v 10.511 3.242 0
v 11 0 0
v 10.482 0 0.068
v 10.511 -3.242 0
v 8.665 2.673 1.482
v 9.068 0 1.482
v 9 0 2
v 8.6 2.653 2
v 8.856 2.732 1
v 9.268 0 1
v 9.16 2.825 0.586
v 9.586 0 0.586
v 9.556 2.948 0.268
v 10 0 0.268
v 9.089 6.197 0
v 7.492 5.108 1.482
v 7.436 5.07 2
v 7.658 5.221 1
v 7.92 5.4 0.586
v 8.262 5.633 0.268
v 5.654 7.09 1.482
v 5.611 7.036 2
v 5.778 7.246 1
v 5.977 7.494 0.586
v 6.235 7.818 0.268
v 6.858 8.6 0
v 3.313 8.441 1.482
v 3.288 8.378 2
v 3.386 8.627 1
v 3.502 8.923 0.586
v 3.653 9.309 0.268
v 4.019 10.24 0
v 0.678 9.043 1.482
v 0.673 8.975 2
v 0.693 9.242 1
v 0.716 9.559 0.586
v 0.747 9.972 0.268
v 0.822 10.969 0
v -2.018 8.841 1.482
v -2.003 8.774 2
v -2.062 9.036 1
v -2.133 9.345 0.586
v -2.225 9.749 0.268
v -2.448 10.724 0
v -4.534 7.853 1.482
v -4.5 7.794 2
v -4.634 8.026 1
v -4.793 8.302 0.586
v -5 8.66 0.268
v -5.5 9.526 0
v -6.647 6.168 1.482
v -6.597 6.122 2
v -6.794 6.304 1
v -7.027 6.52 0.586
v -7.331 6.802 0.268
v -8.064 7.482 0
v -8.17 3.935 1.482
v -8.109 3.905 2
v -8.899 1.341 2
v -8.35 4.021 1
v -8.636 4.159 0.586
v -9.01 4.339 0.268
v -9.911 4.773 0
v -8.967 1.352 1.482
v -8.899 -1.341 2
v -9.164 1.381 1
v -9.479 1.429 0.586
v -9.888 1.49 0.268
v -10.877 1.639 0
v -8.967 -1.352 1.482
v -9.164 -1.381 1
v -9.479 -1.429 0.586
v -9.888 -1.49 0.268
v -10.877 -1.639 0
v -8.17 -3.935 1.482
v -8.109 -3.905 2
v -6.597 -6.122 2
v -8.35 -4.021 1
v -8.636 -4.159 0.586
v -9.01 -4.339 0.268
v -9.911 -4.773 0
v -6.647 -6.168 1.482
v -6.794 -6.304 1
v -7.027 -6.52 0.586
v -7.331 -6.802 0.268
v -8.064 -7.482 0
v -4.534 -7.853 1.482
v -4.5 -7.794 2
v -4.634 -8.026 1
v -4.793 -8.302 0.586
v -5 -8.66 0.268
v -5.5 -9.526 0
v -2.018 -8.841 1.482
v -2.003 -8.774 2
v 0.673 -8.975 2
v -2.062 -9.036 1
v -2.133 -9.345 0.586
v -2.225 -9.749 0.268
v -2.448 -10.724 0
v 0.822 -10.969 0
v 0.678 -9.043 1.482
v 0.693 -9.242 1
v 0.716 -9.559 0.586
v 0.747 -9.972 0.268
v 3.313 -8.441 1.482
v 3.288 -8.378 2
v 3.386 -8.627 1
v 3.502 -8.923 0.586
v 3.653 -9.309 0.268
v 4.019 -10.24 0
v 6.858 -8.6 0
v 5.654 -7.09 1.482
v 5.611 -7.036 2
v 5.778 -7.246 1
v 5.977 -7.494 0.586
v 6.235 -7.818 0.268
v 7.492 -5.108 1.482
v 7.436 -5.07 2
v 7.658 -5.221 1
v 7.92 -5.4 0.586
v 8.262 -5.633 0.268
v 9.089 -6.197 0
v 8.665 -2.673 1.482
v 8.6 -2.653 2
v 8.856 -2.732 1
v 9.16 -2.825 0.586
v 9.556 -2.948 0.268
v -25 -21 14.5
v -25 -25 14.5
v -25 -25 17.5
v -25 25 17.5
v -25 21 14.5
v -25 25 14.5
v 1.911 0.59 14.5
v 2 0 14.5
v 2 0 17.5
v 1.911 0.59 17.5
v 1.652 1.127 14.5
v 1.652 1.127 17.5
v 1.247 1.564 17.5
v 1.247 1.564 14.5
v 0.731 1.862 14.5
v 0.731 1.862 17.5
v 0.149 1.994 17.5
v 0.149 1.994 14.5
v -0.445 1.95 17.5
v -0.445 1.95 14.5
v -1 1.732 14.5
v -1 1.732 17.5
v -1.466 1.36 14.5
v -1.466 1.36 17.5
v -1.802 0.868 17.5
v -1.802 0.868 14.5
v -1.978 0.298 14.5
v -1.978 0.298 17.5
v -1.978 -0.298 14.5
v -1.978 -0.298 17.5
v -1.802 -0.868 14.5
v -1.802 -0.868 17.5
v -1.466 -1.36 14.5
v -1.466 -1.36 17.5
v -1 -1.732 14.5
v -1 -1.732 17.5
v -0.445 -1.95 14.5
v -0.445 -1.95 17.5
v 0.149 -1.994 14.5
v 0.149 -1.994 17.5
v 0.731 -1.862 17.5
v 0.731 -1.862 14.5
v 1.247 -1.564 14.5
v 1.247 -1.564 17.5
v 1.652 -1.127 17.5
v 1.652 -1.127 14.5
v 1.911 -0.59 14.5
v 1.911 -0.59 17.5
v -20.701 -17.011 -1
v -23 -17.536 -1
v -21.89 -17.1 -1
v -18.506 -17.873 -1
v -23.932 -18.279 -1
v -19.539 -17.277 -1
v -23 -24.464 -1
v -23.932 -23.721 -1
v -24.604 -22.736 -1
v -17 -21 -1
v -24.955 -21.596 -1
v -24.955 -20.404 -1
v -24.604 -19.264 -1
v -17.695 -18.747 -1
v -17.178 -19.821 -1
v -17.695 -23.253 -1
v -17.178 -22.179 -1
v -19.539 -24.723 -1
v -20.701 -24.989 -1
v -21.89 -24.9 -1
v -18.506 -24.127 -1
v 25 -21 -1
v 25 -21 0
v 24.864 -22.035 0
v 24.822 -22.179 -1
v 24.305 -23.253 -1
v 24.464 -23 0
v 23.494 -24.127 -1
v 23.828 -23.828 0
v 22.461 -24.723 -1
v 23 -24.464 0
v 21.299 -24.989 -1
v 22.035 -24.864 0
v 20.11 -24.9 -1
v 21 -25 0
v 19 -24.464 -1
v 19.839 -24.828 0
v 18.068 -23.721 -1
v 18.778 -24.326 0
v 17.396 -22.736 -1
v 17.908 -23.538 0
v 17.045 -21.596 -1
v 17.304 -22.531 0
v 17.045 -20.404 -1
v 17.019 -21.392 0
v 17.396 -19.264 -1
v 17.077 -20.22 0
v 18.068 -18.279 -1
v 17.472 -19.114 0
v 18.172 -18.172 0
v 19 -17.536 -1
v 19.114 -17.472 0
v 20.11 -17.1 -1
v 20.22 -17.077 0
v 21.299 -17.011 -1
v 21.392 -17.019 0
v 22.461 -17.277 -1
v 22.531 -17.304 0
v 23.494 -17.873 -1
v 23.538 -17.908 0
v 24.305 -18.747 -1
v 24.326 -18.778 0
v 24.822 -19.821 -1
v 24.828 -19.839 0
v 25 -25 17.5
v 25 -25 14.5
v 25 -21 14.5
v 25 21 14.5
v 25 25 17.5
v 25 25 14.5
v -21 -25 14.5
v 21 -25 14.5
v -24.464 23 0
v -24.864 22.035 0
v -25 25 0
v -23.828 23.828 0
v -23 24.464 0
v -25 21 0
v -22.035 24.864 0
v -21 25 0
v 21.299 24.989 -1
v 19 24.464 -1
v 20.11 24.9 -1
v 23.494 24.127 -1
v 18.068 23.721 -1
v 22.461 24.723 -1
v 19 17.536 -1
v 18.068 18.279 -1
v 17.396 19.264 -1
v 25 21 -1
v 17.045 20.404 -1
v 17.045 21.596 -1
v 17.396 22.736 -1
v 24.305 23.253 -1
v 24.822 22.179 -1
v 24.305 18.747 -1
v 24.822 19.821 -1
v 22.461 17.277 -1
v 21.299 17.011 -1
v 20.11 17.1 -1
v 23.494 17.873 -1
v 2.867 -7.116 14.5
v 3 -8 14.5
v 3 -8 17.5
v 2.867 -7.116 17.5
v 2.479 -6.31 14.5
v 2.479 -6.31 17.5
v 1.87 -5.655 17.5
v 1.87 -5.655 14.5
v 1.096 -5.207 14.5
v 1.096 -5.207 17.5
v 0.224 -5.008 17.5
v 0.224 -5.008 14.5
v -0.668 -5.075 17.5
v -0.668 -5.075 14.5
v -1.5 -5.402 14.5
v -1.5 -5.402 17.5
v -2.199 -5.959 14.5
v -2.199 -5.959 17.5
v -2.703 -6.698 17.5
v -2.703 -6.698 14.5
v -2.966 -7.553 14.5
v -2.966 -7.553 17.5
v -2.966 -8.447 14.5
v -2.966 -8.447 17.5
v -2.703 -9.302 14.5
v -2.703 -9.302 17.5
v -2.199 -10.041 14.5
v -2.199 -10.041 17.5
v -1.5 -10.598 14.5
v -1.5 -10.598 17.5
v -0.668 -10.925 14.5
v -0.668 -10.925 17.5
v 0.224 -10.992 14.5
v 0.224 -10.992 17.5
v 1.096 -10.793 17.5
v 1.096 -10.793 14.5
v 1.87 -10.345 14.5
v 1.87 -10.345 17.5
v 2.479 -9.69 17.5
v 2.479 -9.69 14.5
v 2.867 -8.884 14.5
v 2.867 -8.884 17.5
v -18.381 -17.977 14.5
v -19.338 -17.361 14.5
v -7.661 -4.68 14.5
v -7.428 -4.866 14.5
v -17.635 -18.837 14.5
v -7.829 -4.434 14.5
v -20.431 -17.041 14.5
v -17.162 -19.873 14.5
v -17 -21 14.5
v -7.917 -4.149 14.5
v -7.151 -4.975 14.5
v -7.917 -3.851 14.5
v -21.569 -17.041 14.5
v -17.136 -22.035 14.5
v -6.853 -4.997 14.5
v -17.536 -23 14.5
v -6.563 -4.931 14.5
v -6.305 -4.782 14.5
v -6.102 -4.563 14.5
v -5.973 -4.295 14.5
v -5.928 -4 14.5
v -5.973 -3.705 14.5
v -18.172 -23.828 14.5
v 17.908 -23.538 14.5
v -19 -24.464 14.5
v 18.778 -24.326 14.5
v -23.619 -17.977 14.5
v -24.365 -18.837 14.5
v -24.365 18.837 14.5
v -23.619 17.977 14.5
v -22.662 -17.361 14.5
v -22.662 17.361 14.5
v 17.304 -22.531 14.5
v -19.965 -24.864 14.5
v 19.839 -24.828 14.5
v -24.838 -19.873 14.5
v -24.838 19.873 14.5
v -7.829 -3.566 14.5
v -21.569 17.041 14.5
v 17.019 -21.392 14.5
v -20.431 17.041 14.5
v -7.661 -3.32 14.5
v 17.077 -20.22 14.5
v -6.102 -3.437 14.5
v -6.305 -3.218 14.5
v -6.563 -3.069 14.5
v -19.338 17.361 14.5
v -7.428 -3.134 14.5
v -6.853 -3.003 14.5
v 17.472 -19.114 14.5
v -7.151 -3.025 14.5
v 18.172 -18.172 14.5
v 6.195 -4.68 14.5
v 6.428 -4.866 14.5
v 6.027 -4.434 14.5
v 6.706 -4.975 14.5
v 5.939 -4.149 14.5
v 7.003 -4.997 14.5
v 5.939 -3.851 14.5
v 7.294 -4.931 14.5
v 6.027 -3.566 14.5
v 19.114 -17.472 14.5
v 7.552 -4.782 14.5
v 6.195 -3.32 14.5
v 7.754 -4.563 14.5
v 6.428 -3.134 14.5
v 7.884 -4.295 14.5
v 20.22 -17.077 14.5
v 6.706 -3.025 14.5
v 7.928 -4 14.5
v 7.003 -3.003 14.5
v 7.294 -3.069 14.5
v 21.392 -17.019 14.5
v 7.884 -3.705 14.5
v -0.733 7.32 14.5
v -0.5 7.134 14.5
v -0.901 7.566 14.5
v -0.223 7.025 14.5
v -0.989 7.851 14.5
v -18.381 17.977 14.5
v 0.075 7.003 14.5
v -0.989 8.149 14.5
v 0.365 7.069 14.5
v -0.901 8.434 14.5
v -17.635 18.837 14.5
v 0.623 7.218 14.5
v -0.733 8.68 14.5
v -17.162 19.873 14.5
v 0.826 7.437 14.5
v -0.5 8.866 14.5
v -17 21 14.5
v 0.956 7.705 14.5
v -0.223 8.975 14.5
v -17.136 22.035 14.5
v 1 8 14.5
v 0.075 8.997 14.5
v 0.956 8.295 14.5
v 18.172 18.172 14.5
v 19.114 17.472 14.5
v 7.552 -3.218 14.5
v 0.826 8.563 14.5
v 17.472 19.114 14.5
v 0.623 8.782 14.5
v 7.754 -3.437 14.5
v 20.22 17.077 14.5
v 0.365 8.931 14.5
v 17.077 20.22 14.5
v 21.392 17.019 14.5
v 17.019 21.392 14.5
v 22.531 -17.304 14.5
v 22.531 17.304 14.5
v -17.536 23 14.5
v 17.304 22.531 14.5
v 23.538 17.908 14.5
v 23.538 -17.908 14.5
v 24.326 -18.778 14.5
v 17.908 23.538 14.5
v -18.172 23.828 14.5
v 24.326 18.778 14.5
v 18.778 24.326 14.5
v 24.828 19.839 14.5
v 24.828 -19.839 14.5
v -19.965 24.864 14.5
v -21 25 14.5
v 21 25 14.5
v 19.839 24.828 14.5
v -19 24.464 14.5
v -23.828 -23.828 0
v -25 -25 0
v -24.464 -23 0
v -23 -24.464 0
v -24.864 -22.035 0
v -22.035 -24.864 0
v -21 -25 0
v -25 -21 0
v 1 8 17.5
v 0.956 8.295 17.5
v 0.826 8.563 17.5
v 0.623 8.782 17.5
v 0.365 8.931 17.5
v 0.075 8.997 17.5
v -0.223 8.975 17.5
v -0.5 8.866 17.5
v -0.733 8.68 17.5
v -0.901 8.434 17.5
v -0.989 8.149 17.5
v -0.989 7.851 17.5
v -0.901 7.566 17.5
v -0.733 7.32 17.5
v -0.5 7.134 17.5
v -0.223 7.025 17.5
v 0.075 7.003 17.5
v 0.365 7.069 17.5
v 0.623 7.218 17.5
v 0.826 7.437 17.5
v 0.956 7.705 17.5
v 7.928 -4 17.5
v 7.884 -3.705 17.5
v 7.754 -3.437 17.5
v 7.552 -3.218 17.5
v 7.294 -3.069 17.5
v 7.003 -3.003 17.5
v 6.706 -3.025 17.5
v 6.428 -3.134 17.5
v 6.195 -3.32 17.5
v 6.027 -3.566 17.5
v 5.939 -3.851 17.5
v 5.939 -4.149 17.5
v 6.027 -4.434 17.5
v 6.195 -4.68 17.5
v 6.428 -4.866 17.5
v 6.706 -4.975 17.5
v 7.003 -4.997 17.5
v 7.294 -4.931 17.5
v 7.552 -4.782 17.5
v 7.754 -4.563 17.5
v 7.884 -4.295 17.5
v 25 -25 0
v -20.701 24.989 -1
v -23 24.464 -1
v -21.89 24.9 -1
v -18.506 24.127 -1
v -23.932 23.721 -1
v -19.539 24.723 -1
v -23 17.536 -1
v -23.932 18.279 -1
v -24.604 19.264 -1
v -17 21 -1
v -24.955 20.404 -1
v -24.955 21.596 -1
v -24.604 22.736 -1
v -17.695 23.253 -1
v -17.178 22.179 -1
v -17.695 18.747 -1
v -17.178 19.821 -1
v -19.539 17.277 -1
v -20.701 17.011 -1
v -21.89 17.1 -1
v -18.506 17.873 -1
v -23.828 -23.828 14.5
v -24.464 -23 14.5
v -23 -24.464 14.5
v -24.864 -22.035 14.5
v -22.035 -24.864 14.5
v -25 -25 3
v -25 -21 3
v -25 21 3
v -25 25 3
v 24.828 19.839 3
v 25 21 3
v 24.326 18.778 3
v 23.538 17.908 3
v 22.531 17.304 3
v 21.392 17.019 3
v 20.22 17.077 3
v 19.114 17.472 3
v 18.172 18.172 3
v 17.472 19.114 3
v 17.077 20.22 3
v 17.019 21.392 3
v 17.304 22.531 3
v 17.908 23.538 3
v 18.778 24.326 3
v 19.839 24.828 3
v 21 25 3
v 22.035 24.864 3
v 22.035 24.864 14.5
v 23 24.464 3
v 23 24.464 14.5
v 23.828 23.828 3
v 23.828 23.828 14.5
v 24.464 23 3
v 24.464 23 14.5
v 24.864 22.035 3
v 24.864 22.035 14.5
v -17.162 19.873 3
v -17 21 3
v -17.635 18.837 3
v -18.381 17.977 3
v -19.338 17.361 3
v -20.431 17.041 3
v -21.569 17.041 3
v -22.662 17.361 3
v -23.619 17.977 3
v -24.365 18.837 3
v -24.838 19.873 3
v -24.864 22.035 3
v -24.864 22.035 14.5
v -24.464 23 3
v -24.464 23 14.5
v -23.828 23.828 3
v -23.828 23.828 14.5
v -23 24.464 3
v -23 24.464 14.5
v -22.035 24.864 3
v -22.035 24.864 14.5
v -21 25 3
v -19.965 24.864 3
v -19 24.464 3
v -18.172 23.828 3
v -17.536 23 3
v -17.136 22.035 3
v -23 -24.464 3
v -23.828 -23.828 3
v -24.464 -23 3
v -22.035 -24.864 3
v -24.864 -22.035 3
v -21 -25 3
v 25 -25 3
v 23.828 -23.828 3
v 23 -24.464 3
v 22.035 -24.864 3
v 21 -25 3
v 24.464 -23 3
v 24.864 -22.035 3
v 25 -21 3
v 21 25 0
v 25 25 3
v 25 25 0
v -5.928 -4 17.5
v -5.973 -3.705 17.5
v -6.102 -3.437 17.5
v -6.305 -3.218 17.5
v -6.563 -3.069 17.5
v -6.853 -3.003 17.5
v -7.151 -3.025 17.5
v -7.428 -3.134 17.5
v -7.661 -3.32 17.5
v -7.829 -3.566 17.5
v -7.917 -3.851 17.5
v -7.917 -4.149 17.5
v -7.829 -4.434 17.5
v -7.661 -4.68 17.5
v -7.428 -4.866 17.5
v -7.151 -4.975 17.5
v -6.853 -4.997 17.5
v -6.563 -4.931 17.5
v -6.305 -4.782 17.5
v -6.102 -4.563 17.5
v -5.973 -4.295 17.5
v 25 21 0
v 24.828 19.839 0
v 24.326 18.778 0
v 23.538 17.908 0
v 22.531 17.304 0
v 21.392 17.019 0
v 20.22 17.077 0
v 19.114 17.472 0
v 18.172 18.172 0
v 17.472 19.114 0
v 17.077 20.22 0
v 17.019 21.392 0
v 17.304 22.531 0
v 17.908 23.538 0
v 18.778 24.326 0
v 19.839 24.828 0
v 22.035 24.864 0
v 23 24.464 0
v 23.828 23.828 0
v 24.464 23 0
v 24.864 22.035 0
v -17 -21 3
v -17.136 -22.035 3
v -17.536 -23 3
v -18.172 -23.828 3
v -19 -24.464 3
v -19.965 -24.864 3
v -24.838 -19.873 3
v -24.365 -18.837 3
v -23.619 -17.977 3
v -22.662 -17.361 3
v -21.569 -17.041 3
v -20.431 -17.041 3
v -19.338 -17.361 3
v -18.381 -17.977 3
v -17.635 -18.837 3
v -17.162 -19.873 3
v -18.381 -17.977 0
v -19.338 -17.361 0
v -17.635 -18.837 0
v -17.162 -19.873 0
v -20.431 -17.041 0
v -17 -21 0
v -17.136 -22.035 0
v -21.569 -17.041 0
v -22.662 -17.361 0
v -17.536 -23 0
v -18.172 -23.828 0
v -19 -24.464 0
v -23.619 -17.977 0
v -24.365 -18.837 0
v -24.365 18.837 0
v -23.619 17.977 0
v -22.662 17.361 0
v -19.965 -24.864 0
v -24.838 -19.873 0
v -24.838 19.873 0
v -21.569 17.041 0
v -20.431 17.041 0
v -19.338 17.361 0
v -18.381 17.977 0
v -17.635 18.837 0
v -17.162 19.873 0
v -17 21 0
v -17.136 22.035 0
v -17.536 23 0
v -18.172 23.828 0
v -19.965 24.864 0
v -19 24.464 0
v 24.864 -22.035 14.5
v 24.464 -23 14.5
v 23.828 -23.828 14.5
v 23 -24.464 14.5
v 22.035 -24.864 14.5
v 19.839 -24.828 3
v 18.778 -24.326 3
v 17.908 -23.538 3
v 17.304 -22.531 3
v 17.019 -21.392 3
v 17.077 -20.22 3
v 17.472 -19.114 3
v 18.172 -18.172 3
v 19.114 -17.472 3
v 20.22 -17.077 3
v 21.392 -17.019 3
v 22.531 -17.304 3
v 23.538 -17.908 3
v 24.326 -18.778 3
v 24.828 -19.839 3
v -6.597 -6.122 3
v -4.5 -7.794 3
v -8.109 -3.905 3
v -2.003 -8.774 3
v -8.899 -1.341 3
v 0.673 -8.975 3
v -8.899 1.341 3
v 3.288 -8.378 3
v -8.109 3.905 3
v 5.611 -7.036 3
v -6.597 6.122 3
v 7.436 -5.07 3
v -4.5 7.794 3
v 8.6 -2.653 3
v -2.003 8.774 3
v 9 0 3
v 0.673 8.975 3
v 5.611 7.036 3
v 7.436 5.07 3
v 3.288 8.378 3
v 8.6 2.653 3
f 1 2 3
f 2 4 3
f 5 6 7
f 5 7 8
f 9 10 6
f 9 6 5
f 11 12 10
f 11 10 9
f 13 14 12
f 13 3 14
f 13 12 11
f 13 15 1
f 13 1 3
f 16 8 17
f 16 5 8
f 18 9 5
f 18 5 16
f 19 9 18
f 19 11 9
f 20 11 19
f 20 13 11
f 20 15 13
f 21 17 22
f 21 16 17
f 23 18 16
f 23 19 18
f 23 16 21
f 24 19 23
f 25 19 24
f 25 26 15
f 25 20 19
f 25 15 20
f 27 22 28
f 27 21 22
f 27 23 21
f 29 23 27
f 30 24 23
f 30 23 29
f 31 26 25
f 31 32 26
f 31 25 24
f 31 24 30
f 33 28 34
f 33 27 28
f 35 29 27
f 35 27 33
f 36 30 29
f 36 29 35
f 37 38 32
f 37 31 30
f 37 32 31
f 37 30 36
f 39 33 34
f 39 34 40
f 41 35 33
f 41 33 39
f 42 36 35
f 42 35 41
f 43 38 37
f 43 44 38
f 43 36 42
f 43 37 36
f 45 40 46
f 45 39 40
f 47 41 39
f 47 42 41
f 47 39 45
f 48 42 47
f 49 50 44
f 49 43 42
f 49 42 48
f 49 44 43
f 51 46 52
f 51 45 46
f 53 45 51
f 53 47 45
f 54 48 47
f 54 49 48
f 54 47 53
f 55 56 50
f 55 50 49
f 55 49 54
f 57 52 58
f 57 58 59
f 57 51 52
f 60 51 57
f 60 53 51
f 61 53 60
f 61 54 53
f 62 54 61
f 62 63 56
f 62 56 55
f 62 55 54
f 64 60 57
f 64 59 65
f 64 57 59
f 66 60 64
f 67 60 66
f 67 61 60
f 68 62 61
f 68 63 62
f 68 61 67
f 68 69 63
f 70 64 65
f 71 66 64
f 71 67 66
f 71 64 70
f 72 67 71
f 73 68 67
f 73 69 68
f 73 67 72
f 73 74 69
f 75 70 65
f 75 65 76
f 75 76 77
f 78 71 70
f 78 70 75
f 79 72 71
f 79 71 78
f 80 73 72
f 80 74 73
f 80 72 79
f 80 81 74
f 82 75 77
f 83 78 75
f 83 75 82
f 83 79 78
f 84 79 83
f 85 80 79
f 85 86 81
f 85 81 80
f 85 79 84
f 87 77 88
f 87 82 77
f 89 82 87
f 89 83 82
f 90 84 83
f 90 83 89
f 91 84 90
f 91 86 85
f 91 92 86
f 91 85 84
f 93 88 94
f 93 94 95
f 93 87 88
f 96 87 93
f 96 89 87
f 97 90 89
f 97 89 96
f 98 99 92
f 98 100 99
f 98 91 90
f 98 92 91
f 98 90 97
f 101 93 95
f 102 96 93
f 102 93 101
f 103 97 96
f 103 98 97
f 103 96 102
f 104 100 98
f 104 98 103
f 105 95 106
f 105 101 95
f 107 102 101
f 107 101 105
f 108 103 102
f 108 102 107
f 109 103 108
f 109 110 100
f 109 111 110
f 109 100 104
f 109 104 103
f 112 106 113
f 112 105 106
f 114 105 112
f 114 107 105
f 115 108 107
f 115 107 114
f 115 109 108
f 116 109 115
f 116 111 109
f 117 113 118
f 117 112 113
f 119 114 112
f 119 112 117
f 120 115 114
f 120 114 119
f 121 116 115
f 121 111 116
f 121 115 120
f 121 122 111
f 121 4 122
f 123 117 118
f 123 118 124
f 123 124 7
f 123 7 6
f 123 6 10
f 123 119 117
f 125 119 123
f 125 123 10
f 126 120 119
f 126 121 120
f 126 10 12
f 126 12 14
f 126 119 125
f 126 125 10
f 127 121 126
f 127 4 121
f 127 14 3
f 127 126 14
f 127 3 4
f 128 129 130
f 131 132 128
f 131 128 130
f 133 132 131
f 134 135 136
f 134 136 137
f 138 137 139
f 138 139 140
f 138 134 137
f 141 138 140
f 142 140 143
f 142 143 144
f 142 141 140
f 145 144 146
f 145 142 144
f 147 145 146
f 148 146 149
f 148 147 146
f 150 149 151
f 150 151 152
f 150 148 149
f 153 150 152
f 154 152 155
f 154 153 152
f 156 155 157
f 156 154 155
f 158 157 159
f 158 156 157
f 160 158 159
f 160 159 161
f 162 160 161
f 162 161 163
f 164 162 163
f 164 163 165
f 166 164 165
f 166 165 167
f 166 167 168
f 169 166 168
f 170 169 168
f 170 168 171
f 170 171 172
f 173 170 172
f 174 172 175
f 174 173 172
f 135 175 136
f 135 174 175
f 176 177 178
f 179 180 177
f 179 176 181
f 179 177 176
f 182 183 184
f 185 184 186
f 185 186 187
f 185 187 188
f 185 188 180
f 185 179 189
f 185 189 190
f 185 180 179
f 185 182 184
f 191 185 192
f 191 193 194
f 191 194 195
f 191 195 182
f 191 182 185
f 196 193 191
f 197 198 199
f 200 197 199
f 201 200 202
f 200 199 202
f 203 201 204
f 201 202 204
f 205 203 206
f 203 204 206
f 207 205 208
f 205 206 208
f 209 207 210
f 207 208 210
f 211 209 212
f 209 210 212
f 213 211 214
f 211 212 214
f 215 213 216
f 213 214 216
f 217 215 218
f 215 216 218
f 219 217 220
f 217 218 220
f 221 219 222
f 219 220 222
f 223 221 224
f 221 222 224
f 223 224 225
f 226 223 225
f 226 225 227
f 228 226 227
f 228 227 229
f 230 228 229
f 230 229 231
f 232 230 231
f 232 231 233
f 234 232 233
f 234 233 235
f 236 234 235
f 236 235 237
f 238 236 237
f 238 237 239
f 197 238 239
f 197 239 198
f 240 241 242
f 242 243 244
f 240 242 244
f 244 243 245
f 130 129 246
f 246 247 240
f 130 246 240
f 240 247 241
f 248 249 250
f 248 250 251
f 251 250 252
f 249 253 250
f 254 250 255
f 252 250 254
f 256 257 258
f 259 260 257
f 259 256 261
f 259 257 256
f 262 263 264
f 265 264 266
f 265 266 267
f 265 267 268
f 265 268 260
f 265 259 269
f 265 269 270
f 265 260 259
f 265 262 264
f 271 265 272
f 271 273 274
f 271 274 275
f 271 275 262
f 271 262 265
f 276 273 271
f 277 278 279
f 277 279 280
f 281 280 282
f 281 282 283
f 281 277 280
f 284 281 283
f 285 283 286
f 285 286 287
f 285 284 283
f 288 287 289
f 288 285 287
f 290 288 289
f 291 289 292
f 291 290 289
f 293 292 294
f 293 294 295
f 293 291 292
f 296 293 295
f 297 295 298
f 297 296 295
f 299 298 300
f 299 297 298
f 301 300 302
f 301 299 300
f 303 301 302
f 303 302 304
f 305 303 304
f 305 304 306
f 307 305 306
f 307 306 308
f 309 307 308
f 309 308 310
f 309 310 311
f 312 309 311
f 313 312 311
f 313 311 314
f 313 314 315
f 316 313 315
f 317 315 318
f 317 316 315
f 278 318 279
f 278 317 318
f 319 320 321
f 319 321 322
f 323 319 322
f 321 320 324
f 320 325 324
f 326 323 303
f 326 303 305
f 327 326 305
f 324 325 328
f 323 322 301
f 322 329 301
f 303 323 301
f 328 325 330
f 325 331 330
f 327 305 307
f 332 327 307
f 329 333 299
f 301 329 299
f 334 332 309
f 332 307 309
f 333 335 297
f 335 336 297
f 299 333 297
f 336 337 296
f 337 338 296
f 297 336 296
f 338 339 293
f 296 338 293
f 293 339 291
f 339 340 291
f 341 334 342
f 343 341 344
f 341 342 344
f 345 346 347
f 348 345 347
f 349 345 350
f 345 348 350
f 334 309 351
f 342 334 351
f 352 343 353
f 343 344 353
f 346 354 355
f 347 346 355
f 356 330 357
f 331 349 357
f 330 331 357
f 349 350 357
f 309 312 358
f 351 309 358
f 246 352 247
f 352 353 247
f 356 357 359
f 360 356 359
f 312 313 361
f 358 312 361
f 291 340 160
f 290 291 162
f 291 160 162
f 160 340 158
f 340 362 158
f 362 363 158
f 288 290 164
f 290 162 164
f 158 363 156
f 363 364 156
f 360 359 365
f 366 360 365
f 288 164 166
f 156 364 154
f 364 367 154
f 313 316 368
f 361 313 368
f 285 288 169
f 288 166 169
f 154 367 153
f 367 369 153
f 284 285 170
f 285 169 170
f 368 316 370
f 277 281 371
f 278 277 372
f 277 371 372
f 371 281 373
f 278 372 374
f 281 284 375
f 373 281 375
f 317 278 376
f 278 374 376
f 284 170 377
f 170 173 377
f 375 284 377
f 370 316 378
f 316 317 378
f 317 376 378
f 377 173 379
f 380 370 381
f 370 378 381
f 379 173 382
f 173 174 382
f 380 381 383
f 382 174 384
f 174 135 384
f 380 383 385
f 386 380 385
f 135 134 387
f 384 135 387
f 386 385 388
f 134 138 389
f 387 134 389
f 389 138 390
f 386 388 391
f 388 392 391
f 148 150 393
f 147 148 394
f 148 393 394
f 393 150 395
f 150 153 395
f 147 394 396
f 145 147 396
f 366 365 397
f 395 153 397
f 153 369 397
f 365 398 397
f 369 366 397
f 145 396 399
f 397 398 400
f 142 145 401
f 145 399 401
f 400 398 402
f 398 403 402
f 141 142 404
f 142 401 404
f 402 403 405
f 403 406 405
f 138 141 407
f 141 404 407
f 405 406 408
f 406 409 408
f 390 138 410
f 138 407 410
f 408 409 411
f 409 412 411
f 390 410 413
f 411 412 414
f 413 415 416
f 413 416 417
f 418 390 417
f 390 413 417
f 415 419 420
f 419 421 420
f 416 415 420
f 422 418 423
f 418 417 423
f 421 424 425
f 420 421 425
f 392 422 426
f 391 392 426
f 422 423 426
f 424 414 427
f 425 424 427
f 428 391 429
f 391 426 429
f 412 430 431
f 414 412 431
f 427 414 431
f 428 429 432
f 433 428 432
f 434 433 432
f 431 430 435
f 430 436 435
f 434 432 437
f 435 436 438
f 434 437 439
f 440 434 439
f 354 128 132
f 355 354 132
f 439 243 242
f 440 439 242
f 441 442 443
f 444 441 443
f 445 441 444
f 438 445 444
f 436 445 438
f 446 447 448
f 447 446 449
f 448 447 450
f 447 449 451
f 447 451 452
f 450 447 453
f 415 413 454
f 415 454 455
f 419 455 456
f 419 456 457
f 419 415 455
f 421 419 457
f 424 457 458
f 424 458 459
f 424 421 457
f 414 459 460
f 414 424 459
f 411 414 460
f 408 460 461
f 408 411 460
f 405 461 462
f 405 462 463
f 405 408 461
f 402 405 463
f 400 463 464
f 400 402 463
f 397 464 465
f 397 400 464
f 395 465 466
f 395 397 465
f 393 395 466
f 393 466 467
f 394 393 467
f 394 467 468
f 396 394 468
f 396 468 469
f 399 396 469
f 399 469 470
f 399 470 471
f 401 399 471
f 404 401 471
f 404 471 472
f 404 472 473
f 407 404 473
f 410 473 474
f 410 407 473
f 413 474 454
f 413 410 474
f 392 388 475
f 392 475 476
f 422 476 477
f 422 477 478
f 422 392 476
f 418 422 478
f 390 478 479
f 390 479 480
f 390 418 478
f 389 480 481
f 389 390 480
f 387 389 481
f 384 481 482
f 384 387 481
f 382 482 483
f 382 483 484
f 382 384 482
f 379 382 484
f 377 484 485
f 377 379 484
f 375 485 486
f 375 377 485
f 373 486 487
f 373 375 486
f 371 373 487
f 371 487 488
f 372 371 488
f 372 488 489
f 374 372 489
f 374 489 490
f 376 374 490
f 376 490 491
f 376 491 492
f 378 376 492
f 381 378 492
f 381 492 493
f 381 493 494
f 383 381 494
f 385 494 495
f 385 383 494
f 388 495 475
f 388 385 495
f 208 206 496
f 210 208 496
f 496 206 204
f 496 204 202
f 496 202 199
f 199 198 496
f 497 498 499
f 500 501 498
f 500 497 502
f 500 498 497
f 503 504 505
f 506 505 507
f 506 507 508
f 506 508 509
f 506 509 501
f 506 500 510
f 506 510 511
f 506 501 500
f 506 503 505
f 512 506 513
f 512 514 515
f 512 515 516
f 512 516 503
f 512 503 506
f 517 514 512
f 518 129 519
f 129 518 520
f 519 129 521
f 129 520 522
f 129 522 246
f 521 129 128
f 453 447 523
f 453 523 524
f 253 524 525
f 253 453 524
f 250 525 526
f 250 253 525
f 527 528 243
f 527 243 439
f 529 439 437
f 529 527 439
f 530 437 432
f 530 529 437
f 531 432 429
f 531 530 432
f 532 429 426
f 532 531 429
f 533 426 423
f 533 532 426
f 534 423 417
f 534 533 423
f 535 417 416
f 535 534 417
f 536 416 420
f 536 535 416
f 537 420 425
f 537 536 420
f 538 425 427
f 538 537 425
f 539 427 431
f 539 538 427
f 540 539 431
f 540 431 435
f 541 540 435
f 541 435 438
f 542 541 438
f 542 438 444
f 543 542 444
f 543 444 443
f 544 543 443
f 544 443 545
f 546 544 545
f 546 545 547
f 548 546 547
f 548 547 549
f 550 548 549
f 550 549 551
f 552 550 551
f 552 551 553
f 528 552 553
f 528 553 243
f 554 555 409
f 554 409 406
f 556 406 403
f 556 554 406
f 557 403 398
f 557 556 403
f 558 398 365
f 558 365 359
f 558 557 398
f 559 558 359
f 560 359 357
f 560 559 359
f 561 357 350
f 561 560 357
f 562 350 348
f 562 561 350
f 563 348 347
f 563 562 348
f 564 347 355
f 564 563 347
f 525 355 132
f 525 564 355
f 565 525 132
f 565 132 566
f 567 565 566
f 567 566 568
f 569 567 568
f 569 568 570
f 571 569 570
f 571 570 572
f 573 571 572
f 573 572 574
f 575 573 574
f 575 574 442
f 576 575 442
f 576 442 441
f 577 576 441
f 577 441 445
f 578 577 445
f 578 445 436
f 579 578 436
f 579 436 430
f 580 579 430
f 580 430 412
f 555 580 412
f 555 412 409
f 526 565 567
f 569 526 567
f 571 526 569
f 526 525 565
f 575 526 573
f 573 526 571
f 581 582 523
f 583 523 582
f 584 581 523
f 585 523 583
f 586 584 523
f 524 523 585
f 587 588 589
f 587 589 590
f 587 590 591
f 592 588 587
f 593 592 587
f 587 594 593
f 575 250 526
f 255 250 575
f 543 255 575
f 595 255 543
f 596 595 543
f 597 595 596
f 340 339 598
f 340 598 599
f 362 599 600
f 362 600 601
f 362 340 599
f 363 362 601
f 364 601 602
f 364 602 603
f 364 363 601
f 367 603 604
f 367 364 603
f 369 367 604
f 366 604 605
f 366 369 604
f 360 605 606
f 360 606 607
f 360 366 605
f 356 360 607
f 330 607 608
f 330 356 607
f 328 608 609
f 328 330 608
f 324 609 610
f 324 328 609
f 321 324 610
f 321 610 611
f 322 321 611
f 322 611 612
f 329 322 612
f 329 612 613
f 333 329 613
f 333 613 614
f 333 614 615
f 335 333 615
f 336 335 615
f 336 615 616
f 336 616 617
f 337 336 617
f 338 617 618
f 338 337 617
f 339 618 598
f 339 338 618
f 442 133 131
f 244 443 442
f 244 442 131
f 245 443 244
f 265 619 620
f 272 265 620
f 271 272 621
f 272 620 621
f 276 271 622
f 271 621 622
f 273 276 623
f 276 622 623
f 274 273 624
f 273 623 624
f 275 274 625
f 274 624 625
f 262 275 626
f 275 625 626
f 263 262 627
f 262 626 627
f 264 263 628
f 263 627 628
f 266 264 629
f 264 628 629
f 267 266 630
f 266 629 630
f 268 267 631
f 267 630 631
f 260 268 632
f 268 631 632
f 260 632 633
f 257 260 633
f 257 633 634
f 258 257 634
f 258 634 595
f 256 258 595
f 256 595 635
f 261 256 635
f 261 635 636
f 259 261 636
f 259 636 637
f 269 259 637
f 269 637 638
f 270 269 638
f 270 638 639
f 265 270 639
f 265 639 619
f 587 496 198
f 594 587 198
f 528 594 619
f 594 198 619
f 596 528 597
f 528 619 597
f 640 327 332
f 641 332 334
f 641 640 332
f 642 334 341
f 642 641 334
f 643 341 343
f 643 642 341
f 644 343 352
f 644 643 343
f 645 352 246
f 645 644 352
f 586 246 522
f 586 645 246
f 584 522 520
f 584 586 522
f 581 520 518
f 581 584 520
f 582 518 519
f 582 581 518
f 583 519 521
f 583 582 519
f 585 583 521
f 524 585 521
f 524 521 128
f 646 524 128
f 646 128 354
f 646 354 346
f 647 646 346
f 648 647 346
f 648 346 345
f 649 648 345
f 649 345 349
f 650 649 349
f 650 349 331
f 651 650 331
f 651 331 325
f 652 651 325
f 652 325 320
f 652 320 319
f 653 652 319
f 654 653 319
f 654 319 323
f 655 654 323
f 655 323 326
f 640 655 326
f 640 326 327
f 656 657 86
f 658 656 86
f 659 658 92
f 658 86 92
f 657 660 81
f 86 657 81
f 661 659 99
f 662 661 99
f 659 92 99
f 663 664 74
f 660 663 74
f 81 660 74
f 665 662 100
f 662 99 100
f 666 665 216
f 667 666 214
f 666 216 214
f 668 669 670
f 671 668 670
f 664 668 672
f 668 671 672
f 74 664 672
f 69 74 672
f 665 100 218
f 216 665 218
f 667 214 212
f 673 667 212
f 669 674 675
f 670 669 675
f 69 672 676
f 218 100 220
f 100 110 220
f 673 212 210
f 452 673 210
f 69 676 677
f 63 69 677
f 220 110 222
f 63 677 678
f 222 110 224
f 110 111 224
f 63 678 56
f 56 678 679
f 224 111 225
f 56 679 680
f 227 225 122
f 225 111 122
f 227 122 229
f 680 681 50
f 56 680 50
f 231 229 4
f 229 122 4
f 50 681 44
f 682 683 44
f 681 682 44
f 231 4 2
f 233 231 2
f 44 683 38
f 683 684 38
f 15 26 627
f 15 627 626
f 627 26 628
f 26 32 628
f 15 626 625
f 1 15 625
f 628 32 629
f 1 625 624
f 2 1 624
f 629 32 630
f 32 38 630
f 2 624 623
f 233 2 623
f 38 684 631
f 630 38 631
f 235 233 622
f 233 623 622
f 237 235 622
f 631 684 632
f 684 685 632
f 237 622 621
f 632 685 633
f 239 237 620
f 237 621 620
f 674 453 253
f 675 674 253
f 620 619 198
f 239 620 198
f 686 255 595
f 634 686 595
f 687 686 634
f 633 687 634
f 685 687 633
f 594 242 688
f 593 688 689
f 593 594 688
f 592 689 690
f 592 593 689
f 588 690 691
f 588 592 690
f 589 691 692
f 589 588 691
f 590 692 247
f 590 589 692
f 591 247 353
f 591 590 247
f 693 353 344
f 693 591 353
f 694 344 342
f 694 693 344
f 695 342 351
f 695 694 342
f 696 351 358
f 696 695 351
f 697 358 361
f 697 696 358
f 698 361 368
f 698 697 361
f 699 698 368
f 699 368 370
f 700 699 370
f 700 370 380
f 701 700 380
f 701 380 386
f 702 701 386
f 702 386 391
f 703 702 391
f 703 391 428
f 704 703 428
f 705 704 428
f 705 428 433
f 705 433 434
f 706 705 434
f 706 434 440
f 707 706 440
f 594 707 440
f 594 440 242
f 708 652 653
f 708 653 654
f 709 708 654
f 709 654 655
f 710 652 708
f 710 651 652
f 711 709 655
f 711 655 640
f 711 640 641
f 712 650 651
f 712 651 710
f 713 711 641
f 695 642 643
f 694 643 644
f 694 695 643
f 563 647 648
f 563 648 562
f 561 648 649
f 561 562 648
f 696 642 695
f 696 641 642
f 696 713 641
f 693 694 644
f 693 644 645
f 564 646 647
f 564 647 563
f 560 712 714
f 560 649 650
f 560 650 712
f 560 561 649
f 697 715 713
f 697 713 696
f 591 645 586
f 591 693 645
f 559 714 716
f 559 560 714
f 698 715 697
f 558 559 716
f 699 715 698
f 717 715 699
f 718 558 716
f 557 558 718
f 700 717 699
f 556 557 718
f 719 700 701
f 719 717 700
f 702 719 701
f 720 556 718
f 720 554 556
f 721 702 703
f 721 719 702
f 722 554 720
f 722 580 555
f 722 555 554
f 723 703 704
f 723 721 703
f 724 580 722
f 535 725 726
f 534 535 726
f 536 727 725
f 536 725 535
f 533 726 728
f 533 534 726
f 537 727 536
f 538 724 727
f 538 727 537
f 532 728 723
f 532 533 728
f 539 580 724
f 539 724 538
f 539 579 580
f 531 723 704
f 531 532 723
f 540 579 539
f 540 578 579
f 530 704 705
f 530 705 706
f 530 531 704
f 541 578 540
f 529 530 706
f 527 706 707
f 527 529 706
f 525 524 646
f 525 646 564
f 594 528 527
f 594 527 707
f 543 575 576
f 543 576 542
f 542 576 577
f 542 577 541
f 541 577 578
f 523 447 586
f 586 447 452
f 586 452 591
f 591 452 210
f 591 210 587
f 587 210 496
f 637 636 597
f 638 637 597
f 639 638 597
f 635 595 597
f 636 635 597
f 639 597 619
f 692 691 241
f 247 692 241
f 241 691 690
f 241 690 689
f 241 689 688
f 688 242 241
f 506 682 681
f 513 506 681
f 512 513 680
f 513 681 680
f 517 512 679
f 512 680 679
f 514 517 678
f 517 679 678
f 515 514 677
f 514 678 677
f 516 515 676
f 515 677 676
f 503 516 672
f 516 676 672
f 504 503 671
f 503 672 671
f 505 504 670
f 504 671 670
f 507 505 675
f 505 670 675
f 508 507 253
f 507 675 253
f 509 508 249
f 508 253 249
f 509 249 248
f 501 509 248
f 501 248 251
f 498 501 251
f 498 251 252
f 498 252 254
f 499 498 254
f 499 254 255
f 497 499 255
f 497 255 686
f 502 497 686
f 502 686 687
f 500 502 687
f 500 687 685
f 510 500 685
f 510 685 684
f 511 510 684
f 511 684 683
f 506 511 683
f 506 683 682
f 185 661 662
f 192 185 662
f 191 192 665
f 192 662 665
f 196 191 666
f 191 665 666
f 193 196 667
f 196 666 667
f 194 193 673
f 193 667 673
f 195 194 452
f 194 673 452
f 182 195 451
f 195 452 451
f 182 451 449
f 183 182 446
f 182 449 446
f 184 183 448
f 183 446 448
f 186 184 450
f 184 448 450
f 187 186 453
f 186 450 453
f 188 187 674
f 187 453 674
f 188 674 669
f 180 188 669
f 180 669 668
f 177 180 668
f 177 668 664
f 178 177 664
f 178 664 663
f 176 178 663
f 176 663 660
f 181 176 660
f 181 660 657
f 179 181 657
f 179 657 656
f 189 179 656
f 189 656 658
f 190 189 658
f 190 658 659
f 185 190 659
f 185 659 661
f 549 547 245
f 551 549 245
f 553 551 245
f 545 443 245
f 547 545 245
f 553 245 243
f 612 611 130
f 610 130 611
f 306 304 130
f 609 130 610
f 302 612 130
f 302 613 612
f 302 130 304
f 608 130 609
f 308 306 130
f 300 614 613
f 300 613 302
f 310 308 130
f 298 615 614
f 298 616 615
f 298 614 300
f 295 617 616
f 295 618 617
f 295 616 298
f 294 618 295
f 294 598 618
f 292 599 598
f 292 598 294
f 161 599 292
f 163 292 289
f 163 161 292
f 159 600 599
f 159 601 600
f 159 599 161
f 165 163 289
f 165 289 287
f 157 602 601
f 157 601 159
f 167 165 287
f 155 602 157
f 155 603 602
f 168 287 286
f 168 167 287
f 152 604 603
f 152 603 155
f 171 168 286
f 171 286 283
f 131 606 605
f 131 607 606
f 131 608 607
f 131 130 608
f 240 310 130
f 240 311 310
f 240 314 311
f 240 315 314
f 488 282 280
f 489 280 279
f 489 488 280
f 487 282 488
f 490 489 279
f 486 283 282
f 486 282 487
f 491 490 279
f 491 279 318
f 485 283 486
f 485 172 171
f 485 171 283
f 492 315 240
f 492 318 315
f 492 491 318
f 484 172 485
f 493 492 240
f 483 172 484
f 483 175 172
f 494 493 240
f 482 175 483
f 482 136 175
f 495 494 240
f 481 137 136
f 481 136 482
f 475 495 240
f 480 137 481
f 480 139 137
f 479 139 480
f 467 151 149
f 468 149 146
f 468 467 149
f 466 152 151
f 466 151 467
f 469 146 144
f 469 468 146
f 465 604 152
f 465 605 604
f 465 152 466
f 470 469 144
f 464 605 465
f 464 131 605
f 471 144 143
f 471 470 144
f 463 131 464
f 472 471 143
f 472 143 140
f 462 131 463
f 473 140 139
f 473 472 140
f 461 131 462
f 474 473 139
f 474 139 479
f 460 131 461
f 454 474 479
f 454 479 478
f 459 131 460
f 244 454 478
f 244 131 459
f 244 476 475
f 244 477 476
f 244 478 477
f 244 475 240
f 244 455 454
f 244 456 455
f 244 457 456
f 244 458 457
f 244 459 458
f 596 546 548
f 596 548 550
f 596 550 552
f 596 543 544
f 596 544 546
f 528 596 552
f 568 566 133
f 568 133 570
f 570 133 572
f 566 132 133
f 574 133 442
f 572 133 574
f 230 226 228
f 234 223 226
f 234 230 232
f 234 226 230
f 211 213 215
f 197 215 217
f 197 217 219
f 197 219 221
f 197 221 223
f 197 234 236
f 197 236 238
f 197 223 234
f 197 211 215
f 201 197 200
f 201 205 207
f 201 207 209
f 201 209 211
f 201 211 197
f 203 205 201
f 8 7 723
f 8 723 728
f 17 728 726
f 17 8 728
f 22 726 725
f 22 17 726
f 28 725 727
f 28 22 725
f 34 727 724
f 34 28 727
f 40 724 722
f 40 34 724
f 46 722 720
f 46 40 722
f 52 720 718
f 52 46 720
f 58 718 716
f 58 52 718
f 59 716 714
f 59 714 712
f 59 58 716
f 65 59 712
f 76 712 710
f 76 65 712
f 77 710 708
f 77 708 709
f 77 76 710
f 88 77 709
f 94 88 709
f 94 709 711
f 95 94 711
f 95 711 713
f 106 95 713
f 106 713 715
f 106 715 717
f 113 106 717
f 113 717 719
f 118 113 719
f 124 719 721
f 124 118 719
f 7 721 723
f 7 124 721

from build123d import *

# Parameters (mm, degrees)
SKETCH_W          = 50
SKETCH_H          = 50
SKETCH_R          = 9
PAD_DEPTH         = 3
SKETCH001_R       = 4
PAD001_DEPTH      = 1
PAD001_DEPTH_BACK = 14.5
SKETCH002_W       = 50
SKETCH002_H       = 50
SKETCH002_R       = 1
SKETCH002_R_2     = 3
SKETCH002_R_3     = 2
PAD002_DEPTH      = 3
FILLET_R          = 2


with BuildPart() as part:
    # Sketch → Pad (new body)
    with BuildSketch(Plane.XY):
        Rectangle(SKETCH_W, SKETCH_H)
        Circle(SKETCH_R, mode=Mode.SUBTRACT)
    extrude(amount=PAD_DEPTH)

    # Sketch001 (on Face6 of Pad) → Pad001 (join, two sides)
    with BuildSketch(Plane(origin=(0, 0, 0), x_dir=(1, 0, 0), z_dir=(0, 0, -1))) as pad001_sk:
        with Locations((-21, 21)):
            Circle(SKETCH001_R)
        with Locations((21, 21)):
            Circle(SKETCH001_R)
        with Locations((21, -21)):
            Circle(SKETCH001_R)
        with Locations((-21, -21)):
            Circle(SKETCH001_R)
    extrude(amount=PAD001_DEPTH)
    extrude(pad001_sk.sketch, amount=-PAD001_DEPTH_BACK)

    # Sketch002 (on Face25 of Pad001) → Pad002 (join)
    with BuildSketch(Plane.XY.offset(14.5)):
        Rectangle(SKETCH002_W, SKETCH002_H)
        with Locations((0, 8)):
            Circle(SKETCH002_R, mode=Mode.SUBTRACT)
        with Locations((6.928203, -4)):
            Circle(SKETCH002_R, mode=Mode.SUBTRACT)
        with Locations((-6.928203, -4)):
            Circle(SKETCH002_R, mode=Mode.SUBTRACT)
        with Locations((0, -8)):
            Circle(SKETCH002_R_2, mode=Mode.SUBTRACT)
        Circle(SKETCH002_R_3, mode=Mode.SUBTRACT)
    extrude(amount=PAD002_DEPTH)

    # Fillet
    fillet_edges = [part.edges().sort_by_distance(p)[0] for p in [
        (-9, 0, 0),
    ]]
    fillet(fillet_edges, radius=FILLET_R)


solid = part.part
